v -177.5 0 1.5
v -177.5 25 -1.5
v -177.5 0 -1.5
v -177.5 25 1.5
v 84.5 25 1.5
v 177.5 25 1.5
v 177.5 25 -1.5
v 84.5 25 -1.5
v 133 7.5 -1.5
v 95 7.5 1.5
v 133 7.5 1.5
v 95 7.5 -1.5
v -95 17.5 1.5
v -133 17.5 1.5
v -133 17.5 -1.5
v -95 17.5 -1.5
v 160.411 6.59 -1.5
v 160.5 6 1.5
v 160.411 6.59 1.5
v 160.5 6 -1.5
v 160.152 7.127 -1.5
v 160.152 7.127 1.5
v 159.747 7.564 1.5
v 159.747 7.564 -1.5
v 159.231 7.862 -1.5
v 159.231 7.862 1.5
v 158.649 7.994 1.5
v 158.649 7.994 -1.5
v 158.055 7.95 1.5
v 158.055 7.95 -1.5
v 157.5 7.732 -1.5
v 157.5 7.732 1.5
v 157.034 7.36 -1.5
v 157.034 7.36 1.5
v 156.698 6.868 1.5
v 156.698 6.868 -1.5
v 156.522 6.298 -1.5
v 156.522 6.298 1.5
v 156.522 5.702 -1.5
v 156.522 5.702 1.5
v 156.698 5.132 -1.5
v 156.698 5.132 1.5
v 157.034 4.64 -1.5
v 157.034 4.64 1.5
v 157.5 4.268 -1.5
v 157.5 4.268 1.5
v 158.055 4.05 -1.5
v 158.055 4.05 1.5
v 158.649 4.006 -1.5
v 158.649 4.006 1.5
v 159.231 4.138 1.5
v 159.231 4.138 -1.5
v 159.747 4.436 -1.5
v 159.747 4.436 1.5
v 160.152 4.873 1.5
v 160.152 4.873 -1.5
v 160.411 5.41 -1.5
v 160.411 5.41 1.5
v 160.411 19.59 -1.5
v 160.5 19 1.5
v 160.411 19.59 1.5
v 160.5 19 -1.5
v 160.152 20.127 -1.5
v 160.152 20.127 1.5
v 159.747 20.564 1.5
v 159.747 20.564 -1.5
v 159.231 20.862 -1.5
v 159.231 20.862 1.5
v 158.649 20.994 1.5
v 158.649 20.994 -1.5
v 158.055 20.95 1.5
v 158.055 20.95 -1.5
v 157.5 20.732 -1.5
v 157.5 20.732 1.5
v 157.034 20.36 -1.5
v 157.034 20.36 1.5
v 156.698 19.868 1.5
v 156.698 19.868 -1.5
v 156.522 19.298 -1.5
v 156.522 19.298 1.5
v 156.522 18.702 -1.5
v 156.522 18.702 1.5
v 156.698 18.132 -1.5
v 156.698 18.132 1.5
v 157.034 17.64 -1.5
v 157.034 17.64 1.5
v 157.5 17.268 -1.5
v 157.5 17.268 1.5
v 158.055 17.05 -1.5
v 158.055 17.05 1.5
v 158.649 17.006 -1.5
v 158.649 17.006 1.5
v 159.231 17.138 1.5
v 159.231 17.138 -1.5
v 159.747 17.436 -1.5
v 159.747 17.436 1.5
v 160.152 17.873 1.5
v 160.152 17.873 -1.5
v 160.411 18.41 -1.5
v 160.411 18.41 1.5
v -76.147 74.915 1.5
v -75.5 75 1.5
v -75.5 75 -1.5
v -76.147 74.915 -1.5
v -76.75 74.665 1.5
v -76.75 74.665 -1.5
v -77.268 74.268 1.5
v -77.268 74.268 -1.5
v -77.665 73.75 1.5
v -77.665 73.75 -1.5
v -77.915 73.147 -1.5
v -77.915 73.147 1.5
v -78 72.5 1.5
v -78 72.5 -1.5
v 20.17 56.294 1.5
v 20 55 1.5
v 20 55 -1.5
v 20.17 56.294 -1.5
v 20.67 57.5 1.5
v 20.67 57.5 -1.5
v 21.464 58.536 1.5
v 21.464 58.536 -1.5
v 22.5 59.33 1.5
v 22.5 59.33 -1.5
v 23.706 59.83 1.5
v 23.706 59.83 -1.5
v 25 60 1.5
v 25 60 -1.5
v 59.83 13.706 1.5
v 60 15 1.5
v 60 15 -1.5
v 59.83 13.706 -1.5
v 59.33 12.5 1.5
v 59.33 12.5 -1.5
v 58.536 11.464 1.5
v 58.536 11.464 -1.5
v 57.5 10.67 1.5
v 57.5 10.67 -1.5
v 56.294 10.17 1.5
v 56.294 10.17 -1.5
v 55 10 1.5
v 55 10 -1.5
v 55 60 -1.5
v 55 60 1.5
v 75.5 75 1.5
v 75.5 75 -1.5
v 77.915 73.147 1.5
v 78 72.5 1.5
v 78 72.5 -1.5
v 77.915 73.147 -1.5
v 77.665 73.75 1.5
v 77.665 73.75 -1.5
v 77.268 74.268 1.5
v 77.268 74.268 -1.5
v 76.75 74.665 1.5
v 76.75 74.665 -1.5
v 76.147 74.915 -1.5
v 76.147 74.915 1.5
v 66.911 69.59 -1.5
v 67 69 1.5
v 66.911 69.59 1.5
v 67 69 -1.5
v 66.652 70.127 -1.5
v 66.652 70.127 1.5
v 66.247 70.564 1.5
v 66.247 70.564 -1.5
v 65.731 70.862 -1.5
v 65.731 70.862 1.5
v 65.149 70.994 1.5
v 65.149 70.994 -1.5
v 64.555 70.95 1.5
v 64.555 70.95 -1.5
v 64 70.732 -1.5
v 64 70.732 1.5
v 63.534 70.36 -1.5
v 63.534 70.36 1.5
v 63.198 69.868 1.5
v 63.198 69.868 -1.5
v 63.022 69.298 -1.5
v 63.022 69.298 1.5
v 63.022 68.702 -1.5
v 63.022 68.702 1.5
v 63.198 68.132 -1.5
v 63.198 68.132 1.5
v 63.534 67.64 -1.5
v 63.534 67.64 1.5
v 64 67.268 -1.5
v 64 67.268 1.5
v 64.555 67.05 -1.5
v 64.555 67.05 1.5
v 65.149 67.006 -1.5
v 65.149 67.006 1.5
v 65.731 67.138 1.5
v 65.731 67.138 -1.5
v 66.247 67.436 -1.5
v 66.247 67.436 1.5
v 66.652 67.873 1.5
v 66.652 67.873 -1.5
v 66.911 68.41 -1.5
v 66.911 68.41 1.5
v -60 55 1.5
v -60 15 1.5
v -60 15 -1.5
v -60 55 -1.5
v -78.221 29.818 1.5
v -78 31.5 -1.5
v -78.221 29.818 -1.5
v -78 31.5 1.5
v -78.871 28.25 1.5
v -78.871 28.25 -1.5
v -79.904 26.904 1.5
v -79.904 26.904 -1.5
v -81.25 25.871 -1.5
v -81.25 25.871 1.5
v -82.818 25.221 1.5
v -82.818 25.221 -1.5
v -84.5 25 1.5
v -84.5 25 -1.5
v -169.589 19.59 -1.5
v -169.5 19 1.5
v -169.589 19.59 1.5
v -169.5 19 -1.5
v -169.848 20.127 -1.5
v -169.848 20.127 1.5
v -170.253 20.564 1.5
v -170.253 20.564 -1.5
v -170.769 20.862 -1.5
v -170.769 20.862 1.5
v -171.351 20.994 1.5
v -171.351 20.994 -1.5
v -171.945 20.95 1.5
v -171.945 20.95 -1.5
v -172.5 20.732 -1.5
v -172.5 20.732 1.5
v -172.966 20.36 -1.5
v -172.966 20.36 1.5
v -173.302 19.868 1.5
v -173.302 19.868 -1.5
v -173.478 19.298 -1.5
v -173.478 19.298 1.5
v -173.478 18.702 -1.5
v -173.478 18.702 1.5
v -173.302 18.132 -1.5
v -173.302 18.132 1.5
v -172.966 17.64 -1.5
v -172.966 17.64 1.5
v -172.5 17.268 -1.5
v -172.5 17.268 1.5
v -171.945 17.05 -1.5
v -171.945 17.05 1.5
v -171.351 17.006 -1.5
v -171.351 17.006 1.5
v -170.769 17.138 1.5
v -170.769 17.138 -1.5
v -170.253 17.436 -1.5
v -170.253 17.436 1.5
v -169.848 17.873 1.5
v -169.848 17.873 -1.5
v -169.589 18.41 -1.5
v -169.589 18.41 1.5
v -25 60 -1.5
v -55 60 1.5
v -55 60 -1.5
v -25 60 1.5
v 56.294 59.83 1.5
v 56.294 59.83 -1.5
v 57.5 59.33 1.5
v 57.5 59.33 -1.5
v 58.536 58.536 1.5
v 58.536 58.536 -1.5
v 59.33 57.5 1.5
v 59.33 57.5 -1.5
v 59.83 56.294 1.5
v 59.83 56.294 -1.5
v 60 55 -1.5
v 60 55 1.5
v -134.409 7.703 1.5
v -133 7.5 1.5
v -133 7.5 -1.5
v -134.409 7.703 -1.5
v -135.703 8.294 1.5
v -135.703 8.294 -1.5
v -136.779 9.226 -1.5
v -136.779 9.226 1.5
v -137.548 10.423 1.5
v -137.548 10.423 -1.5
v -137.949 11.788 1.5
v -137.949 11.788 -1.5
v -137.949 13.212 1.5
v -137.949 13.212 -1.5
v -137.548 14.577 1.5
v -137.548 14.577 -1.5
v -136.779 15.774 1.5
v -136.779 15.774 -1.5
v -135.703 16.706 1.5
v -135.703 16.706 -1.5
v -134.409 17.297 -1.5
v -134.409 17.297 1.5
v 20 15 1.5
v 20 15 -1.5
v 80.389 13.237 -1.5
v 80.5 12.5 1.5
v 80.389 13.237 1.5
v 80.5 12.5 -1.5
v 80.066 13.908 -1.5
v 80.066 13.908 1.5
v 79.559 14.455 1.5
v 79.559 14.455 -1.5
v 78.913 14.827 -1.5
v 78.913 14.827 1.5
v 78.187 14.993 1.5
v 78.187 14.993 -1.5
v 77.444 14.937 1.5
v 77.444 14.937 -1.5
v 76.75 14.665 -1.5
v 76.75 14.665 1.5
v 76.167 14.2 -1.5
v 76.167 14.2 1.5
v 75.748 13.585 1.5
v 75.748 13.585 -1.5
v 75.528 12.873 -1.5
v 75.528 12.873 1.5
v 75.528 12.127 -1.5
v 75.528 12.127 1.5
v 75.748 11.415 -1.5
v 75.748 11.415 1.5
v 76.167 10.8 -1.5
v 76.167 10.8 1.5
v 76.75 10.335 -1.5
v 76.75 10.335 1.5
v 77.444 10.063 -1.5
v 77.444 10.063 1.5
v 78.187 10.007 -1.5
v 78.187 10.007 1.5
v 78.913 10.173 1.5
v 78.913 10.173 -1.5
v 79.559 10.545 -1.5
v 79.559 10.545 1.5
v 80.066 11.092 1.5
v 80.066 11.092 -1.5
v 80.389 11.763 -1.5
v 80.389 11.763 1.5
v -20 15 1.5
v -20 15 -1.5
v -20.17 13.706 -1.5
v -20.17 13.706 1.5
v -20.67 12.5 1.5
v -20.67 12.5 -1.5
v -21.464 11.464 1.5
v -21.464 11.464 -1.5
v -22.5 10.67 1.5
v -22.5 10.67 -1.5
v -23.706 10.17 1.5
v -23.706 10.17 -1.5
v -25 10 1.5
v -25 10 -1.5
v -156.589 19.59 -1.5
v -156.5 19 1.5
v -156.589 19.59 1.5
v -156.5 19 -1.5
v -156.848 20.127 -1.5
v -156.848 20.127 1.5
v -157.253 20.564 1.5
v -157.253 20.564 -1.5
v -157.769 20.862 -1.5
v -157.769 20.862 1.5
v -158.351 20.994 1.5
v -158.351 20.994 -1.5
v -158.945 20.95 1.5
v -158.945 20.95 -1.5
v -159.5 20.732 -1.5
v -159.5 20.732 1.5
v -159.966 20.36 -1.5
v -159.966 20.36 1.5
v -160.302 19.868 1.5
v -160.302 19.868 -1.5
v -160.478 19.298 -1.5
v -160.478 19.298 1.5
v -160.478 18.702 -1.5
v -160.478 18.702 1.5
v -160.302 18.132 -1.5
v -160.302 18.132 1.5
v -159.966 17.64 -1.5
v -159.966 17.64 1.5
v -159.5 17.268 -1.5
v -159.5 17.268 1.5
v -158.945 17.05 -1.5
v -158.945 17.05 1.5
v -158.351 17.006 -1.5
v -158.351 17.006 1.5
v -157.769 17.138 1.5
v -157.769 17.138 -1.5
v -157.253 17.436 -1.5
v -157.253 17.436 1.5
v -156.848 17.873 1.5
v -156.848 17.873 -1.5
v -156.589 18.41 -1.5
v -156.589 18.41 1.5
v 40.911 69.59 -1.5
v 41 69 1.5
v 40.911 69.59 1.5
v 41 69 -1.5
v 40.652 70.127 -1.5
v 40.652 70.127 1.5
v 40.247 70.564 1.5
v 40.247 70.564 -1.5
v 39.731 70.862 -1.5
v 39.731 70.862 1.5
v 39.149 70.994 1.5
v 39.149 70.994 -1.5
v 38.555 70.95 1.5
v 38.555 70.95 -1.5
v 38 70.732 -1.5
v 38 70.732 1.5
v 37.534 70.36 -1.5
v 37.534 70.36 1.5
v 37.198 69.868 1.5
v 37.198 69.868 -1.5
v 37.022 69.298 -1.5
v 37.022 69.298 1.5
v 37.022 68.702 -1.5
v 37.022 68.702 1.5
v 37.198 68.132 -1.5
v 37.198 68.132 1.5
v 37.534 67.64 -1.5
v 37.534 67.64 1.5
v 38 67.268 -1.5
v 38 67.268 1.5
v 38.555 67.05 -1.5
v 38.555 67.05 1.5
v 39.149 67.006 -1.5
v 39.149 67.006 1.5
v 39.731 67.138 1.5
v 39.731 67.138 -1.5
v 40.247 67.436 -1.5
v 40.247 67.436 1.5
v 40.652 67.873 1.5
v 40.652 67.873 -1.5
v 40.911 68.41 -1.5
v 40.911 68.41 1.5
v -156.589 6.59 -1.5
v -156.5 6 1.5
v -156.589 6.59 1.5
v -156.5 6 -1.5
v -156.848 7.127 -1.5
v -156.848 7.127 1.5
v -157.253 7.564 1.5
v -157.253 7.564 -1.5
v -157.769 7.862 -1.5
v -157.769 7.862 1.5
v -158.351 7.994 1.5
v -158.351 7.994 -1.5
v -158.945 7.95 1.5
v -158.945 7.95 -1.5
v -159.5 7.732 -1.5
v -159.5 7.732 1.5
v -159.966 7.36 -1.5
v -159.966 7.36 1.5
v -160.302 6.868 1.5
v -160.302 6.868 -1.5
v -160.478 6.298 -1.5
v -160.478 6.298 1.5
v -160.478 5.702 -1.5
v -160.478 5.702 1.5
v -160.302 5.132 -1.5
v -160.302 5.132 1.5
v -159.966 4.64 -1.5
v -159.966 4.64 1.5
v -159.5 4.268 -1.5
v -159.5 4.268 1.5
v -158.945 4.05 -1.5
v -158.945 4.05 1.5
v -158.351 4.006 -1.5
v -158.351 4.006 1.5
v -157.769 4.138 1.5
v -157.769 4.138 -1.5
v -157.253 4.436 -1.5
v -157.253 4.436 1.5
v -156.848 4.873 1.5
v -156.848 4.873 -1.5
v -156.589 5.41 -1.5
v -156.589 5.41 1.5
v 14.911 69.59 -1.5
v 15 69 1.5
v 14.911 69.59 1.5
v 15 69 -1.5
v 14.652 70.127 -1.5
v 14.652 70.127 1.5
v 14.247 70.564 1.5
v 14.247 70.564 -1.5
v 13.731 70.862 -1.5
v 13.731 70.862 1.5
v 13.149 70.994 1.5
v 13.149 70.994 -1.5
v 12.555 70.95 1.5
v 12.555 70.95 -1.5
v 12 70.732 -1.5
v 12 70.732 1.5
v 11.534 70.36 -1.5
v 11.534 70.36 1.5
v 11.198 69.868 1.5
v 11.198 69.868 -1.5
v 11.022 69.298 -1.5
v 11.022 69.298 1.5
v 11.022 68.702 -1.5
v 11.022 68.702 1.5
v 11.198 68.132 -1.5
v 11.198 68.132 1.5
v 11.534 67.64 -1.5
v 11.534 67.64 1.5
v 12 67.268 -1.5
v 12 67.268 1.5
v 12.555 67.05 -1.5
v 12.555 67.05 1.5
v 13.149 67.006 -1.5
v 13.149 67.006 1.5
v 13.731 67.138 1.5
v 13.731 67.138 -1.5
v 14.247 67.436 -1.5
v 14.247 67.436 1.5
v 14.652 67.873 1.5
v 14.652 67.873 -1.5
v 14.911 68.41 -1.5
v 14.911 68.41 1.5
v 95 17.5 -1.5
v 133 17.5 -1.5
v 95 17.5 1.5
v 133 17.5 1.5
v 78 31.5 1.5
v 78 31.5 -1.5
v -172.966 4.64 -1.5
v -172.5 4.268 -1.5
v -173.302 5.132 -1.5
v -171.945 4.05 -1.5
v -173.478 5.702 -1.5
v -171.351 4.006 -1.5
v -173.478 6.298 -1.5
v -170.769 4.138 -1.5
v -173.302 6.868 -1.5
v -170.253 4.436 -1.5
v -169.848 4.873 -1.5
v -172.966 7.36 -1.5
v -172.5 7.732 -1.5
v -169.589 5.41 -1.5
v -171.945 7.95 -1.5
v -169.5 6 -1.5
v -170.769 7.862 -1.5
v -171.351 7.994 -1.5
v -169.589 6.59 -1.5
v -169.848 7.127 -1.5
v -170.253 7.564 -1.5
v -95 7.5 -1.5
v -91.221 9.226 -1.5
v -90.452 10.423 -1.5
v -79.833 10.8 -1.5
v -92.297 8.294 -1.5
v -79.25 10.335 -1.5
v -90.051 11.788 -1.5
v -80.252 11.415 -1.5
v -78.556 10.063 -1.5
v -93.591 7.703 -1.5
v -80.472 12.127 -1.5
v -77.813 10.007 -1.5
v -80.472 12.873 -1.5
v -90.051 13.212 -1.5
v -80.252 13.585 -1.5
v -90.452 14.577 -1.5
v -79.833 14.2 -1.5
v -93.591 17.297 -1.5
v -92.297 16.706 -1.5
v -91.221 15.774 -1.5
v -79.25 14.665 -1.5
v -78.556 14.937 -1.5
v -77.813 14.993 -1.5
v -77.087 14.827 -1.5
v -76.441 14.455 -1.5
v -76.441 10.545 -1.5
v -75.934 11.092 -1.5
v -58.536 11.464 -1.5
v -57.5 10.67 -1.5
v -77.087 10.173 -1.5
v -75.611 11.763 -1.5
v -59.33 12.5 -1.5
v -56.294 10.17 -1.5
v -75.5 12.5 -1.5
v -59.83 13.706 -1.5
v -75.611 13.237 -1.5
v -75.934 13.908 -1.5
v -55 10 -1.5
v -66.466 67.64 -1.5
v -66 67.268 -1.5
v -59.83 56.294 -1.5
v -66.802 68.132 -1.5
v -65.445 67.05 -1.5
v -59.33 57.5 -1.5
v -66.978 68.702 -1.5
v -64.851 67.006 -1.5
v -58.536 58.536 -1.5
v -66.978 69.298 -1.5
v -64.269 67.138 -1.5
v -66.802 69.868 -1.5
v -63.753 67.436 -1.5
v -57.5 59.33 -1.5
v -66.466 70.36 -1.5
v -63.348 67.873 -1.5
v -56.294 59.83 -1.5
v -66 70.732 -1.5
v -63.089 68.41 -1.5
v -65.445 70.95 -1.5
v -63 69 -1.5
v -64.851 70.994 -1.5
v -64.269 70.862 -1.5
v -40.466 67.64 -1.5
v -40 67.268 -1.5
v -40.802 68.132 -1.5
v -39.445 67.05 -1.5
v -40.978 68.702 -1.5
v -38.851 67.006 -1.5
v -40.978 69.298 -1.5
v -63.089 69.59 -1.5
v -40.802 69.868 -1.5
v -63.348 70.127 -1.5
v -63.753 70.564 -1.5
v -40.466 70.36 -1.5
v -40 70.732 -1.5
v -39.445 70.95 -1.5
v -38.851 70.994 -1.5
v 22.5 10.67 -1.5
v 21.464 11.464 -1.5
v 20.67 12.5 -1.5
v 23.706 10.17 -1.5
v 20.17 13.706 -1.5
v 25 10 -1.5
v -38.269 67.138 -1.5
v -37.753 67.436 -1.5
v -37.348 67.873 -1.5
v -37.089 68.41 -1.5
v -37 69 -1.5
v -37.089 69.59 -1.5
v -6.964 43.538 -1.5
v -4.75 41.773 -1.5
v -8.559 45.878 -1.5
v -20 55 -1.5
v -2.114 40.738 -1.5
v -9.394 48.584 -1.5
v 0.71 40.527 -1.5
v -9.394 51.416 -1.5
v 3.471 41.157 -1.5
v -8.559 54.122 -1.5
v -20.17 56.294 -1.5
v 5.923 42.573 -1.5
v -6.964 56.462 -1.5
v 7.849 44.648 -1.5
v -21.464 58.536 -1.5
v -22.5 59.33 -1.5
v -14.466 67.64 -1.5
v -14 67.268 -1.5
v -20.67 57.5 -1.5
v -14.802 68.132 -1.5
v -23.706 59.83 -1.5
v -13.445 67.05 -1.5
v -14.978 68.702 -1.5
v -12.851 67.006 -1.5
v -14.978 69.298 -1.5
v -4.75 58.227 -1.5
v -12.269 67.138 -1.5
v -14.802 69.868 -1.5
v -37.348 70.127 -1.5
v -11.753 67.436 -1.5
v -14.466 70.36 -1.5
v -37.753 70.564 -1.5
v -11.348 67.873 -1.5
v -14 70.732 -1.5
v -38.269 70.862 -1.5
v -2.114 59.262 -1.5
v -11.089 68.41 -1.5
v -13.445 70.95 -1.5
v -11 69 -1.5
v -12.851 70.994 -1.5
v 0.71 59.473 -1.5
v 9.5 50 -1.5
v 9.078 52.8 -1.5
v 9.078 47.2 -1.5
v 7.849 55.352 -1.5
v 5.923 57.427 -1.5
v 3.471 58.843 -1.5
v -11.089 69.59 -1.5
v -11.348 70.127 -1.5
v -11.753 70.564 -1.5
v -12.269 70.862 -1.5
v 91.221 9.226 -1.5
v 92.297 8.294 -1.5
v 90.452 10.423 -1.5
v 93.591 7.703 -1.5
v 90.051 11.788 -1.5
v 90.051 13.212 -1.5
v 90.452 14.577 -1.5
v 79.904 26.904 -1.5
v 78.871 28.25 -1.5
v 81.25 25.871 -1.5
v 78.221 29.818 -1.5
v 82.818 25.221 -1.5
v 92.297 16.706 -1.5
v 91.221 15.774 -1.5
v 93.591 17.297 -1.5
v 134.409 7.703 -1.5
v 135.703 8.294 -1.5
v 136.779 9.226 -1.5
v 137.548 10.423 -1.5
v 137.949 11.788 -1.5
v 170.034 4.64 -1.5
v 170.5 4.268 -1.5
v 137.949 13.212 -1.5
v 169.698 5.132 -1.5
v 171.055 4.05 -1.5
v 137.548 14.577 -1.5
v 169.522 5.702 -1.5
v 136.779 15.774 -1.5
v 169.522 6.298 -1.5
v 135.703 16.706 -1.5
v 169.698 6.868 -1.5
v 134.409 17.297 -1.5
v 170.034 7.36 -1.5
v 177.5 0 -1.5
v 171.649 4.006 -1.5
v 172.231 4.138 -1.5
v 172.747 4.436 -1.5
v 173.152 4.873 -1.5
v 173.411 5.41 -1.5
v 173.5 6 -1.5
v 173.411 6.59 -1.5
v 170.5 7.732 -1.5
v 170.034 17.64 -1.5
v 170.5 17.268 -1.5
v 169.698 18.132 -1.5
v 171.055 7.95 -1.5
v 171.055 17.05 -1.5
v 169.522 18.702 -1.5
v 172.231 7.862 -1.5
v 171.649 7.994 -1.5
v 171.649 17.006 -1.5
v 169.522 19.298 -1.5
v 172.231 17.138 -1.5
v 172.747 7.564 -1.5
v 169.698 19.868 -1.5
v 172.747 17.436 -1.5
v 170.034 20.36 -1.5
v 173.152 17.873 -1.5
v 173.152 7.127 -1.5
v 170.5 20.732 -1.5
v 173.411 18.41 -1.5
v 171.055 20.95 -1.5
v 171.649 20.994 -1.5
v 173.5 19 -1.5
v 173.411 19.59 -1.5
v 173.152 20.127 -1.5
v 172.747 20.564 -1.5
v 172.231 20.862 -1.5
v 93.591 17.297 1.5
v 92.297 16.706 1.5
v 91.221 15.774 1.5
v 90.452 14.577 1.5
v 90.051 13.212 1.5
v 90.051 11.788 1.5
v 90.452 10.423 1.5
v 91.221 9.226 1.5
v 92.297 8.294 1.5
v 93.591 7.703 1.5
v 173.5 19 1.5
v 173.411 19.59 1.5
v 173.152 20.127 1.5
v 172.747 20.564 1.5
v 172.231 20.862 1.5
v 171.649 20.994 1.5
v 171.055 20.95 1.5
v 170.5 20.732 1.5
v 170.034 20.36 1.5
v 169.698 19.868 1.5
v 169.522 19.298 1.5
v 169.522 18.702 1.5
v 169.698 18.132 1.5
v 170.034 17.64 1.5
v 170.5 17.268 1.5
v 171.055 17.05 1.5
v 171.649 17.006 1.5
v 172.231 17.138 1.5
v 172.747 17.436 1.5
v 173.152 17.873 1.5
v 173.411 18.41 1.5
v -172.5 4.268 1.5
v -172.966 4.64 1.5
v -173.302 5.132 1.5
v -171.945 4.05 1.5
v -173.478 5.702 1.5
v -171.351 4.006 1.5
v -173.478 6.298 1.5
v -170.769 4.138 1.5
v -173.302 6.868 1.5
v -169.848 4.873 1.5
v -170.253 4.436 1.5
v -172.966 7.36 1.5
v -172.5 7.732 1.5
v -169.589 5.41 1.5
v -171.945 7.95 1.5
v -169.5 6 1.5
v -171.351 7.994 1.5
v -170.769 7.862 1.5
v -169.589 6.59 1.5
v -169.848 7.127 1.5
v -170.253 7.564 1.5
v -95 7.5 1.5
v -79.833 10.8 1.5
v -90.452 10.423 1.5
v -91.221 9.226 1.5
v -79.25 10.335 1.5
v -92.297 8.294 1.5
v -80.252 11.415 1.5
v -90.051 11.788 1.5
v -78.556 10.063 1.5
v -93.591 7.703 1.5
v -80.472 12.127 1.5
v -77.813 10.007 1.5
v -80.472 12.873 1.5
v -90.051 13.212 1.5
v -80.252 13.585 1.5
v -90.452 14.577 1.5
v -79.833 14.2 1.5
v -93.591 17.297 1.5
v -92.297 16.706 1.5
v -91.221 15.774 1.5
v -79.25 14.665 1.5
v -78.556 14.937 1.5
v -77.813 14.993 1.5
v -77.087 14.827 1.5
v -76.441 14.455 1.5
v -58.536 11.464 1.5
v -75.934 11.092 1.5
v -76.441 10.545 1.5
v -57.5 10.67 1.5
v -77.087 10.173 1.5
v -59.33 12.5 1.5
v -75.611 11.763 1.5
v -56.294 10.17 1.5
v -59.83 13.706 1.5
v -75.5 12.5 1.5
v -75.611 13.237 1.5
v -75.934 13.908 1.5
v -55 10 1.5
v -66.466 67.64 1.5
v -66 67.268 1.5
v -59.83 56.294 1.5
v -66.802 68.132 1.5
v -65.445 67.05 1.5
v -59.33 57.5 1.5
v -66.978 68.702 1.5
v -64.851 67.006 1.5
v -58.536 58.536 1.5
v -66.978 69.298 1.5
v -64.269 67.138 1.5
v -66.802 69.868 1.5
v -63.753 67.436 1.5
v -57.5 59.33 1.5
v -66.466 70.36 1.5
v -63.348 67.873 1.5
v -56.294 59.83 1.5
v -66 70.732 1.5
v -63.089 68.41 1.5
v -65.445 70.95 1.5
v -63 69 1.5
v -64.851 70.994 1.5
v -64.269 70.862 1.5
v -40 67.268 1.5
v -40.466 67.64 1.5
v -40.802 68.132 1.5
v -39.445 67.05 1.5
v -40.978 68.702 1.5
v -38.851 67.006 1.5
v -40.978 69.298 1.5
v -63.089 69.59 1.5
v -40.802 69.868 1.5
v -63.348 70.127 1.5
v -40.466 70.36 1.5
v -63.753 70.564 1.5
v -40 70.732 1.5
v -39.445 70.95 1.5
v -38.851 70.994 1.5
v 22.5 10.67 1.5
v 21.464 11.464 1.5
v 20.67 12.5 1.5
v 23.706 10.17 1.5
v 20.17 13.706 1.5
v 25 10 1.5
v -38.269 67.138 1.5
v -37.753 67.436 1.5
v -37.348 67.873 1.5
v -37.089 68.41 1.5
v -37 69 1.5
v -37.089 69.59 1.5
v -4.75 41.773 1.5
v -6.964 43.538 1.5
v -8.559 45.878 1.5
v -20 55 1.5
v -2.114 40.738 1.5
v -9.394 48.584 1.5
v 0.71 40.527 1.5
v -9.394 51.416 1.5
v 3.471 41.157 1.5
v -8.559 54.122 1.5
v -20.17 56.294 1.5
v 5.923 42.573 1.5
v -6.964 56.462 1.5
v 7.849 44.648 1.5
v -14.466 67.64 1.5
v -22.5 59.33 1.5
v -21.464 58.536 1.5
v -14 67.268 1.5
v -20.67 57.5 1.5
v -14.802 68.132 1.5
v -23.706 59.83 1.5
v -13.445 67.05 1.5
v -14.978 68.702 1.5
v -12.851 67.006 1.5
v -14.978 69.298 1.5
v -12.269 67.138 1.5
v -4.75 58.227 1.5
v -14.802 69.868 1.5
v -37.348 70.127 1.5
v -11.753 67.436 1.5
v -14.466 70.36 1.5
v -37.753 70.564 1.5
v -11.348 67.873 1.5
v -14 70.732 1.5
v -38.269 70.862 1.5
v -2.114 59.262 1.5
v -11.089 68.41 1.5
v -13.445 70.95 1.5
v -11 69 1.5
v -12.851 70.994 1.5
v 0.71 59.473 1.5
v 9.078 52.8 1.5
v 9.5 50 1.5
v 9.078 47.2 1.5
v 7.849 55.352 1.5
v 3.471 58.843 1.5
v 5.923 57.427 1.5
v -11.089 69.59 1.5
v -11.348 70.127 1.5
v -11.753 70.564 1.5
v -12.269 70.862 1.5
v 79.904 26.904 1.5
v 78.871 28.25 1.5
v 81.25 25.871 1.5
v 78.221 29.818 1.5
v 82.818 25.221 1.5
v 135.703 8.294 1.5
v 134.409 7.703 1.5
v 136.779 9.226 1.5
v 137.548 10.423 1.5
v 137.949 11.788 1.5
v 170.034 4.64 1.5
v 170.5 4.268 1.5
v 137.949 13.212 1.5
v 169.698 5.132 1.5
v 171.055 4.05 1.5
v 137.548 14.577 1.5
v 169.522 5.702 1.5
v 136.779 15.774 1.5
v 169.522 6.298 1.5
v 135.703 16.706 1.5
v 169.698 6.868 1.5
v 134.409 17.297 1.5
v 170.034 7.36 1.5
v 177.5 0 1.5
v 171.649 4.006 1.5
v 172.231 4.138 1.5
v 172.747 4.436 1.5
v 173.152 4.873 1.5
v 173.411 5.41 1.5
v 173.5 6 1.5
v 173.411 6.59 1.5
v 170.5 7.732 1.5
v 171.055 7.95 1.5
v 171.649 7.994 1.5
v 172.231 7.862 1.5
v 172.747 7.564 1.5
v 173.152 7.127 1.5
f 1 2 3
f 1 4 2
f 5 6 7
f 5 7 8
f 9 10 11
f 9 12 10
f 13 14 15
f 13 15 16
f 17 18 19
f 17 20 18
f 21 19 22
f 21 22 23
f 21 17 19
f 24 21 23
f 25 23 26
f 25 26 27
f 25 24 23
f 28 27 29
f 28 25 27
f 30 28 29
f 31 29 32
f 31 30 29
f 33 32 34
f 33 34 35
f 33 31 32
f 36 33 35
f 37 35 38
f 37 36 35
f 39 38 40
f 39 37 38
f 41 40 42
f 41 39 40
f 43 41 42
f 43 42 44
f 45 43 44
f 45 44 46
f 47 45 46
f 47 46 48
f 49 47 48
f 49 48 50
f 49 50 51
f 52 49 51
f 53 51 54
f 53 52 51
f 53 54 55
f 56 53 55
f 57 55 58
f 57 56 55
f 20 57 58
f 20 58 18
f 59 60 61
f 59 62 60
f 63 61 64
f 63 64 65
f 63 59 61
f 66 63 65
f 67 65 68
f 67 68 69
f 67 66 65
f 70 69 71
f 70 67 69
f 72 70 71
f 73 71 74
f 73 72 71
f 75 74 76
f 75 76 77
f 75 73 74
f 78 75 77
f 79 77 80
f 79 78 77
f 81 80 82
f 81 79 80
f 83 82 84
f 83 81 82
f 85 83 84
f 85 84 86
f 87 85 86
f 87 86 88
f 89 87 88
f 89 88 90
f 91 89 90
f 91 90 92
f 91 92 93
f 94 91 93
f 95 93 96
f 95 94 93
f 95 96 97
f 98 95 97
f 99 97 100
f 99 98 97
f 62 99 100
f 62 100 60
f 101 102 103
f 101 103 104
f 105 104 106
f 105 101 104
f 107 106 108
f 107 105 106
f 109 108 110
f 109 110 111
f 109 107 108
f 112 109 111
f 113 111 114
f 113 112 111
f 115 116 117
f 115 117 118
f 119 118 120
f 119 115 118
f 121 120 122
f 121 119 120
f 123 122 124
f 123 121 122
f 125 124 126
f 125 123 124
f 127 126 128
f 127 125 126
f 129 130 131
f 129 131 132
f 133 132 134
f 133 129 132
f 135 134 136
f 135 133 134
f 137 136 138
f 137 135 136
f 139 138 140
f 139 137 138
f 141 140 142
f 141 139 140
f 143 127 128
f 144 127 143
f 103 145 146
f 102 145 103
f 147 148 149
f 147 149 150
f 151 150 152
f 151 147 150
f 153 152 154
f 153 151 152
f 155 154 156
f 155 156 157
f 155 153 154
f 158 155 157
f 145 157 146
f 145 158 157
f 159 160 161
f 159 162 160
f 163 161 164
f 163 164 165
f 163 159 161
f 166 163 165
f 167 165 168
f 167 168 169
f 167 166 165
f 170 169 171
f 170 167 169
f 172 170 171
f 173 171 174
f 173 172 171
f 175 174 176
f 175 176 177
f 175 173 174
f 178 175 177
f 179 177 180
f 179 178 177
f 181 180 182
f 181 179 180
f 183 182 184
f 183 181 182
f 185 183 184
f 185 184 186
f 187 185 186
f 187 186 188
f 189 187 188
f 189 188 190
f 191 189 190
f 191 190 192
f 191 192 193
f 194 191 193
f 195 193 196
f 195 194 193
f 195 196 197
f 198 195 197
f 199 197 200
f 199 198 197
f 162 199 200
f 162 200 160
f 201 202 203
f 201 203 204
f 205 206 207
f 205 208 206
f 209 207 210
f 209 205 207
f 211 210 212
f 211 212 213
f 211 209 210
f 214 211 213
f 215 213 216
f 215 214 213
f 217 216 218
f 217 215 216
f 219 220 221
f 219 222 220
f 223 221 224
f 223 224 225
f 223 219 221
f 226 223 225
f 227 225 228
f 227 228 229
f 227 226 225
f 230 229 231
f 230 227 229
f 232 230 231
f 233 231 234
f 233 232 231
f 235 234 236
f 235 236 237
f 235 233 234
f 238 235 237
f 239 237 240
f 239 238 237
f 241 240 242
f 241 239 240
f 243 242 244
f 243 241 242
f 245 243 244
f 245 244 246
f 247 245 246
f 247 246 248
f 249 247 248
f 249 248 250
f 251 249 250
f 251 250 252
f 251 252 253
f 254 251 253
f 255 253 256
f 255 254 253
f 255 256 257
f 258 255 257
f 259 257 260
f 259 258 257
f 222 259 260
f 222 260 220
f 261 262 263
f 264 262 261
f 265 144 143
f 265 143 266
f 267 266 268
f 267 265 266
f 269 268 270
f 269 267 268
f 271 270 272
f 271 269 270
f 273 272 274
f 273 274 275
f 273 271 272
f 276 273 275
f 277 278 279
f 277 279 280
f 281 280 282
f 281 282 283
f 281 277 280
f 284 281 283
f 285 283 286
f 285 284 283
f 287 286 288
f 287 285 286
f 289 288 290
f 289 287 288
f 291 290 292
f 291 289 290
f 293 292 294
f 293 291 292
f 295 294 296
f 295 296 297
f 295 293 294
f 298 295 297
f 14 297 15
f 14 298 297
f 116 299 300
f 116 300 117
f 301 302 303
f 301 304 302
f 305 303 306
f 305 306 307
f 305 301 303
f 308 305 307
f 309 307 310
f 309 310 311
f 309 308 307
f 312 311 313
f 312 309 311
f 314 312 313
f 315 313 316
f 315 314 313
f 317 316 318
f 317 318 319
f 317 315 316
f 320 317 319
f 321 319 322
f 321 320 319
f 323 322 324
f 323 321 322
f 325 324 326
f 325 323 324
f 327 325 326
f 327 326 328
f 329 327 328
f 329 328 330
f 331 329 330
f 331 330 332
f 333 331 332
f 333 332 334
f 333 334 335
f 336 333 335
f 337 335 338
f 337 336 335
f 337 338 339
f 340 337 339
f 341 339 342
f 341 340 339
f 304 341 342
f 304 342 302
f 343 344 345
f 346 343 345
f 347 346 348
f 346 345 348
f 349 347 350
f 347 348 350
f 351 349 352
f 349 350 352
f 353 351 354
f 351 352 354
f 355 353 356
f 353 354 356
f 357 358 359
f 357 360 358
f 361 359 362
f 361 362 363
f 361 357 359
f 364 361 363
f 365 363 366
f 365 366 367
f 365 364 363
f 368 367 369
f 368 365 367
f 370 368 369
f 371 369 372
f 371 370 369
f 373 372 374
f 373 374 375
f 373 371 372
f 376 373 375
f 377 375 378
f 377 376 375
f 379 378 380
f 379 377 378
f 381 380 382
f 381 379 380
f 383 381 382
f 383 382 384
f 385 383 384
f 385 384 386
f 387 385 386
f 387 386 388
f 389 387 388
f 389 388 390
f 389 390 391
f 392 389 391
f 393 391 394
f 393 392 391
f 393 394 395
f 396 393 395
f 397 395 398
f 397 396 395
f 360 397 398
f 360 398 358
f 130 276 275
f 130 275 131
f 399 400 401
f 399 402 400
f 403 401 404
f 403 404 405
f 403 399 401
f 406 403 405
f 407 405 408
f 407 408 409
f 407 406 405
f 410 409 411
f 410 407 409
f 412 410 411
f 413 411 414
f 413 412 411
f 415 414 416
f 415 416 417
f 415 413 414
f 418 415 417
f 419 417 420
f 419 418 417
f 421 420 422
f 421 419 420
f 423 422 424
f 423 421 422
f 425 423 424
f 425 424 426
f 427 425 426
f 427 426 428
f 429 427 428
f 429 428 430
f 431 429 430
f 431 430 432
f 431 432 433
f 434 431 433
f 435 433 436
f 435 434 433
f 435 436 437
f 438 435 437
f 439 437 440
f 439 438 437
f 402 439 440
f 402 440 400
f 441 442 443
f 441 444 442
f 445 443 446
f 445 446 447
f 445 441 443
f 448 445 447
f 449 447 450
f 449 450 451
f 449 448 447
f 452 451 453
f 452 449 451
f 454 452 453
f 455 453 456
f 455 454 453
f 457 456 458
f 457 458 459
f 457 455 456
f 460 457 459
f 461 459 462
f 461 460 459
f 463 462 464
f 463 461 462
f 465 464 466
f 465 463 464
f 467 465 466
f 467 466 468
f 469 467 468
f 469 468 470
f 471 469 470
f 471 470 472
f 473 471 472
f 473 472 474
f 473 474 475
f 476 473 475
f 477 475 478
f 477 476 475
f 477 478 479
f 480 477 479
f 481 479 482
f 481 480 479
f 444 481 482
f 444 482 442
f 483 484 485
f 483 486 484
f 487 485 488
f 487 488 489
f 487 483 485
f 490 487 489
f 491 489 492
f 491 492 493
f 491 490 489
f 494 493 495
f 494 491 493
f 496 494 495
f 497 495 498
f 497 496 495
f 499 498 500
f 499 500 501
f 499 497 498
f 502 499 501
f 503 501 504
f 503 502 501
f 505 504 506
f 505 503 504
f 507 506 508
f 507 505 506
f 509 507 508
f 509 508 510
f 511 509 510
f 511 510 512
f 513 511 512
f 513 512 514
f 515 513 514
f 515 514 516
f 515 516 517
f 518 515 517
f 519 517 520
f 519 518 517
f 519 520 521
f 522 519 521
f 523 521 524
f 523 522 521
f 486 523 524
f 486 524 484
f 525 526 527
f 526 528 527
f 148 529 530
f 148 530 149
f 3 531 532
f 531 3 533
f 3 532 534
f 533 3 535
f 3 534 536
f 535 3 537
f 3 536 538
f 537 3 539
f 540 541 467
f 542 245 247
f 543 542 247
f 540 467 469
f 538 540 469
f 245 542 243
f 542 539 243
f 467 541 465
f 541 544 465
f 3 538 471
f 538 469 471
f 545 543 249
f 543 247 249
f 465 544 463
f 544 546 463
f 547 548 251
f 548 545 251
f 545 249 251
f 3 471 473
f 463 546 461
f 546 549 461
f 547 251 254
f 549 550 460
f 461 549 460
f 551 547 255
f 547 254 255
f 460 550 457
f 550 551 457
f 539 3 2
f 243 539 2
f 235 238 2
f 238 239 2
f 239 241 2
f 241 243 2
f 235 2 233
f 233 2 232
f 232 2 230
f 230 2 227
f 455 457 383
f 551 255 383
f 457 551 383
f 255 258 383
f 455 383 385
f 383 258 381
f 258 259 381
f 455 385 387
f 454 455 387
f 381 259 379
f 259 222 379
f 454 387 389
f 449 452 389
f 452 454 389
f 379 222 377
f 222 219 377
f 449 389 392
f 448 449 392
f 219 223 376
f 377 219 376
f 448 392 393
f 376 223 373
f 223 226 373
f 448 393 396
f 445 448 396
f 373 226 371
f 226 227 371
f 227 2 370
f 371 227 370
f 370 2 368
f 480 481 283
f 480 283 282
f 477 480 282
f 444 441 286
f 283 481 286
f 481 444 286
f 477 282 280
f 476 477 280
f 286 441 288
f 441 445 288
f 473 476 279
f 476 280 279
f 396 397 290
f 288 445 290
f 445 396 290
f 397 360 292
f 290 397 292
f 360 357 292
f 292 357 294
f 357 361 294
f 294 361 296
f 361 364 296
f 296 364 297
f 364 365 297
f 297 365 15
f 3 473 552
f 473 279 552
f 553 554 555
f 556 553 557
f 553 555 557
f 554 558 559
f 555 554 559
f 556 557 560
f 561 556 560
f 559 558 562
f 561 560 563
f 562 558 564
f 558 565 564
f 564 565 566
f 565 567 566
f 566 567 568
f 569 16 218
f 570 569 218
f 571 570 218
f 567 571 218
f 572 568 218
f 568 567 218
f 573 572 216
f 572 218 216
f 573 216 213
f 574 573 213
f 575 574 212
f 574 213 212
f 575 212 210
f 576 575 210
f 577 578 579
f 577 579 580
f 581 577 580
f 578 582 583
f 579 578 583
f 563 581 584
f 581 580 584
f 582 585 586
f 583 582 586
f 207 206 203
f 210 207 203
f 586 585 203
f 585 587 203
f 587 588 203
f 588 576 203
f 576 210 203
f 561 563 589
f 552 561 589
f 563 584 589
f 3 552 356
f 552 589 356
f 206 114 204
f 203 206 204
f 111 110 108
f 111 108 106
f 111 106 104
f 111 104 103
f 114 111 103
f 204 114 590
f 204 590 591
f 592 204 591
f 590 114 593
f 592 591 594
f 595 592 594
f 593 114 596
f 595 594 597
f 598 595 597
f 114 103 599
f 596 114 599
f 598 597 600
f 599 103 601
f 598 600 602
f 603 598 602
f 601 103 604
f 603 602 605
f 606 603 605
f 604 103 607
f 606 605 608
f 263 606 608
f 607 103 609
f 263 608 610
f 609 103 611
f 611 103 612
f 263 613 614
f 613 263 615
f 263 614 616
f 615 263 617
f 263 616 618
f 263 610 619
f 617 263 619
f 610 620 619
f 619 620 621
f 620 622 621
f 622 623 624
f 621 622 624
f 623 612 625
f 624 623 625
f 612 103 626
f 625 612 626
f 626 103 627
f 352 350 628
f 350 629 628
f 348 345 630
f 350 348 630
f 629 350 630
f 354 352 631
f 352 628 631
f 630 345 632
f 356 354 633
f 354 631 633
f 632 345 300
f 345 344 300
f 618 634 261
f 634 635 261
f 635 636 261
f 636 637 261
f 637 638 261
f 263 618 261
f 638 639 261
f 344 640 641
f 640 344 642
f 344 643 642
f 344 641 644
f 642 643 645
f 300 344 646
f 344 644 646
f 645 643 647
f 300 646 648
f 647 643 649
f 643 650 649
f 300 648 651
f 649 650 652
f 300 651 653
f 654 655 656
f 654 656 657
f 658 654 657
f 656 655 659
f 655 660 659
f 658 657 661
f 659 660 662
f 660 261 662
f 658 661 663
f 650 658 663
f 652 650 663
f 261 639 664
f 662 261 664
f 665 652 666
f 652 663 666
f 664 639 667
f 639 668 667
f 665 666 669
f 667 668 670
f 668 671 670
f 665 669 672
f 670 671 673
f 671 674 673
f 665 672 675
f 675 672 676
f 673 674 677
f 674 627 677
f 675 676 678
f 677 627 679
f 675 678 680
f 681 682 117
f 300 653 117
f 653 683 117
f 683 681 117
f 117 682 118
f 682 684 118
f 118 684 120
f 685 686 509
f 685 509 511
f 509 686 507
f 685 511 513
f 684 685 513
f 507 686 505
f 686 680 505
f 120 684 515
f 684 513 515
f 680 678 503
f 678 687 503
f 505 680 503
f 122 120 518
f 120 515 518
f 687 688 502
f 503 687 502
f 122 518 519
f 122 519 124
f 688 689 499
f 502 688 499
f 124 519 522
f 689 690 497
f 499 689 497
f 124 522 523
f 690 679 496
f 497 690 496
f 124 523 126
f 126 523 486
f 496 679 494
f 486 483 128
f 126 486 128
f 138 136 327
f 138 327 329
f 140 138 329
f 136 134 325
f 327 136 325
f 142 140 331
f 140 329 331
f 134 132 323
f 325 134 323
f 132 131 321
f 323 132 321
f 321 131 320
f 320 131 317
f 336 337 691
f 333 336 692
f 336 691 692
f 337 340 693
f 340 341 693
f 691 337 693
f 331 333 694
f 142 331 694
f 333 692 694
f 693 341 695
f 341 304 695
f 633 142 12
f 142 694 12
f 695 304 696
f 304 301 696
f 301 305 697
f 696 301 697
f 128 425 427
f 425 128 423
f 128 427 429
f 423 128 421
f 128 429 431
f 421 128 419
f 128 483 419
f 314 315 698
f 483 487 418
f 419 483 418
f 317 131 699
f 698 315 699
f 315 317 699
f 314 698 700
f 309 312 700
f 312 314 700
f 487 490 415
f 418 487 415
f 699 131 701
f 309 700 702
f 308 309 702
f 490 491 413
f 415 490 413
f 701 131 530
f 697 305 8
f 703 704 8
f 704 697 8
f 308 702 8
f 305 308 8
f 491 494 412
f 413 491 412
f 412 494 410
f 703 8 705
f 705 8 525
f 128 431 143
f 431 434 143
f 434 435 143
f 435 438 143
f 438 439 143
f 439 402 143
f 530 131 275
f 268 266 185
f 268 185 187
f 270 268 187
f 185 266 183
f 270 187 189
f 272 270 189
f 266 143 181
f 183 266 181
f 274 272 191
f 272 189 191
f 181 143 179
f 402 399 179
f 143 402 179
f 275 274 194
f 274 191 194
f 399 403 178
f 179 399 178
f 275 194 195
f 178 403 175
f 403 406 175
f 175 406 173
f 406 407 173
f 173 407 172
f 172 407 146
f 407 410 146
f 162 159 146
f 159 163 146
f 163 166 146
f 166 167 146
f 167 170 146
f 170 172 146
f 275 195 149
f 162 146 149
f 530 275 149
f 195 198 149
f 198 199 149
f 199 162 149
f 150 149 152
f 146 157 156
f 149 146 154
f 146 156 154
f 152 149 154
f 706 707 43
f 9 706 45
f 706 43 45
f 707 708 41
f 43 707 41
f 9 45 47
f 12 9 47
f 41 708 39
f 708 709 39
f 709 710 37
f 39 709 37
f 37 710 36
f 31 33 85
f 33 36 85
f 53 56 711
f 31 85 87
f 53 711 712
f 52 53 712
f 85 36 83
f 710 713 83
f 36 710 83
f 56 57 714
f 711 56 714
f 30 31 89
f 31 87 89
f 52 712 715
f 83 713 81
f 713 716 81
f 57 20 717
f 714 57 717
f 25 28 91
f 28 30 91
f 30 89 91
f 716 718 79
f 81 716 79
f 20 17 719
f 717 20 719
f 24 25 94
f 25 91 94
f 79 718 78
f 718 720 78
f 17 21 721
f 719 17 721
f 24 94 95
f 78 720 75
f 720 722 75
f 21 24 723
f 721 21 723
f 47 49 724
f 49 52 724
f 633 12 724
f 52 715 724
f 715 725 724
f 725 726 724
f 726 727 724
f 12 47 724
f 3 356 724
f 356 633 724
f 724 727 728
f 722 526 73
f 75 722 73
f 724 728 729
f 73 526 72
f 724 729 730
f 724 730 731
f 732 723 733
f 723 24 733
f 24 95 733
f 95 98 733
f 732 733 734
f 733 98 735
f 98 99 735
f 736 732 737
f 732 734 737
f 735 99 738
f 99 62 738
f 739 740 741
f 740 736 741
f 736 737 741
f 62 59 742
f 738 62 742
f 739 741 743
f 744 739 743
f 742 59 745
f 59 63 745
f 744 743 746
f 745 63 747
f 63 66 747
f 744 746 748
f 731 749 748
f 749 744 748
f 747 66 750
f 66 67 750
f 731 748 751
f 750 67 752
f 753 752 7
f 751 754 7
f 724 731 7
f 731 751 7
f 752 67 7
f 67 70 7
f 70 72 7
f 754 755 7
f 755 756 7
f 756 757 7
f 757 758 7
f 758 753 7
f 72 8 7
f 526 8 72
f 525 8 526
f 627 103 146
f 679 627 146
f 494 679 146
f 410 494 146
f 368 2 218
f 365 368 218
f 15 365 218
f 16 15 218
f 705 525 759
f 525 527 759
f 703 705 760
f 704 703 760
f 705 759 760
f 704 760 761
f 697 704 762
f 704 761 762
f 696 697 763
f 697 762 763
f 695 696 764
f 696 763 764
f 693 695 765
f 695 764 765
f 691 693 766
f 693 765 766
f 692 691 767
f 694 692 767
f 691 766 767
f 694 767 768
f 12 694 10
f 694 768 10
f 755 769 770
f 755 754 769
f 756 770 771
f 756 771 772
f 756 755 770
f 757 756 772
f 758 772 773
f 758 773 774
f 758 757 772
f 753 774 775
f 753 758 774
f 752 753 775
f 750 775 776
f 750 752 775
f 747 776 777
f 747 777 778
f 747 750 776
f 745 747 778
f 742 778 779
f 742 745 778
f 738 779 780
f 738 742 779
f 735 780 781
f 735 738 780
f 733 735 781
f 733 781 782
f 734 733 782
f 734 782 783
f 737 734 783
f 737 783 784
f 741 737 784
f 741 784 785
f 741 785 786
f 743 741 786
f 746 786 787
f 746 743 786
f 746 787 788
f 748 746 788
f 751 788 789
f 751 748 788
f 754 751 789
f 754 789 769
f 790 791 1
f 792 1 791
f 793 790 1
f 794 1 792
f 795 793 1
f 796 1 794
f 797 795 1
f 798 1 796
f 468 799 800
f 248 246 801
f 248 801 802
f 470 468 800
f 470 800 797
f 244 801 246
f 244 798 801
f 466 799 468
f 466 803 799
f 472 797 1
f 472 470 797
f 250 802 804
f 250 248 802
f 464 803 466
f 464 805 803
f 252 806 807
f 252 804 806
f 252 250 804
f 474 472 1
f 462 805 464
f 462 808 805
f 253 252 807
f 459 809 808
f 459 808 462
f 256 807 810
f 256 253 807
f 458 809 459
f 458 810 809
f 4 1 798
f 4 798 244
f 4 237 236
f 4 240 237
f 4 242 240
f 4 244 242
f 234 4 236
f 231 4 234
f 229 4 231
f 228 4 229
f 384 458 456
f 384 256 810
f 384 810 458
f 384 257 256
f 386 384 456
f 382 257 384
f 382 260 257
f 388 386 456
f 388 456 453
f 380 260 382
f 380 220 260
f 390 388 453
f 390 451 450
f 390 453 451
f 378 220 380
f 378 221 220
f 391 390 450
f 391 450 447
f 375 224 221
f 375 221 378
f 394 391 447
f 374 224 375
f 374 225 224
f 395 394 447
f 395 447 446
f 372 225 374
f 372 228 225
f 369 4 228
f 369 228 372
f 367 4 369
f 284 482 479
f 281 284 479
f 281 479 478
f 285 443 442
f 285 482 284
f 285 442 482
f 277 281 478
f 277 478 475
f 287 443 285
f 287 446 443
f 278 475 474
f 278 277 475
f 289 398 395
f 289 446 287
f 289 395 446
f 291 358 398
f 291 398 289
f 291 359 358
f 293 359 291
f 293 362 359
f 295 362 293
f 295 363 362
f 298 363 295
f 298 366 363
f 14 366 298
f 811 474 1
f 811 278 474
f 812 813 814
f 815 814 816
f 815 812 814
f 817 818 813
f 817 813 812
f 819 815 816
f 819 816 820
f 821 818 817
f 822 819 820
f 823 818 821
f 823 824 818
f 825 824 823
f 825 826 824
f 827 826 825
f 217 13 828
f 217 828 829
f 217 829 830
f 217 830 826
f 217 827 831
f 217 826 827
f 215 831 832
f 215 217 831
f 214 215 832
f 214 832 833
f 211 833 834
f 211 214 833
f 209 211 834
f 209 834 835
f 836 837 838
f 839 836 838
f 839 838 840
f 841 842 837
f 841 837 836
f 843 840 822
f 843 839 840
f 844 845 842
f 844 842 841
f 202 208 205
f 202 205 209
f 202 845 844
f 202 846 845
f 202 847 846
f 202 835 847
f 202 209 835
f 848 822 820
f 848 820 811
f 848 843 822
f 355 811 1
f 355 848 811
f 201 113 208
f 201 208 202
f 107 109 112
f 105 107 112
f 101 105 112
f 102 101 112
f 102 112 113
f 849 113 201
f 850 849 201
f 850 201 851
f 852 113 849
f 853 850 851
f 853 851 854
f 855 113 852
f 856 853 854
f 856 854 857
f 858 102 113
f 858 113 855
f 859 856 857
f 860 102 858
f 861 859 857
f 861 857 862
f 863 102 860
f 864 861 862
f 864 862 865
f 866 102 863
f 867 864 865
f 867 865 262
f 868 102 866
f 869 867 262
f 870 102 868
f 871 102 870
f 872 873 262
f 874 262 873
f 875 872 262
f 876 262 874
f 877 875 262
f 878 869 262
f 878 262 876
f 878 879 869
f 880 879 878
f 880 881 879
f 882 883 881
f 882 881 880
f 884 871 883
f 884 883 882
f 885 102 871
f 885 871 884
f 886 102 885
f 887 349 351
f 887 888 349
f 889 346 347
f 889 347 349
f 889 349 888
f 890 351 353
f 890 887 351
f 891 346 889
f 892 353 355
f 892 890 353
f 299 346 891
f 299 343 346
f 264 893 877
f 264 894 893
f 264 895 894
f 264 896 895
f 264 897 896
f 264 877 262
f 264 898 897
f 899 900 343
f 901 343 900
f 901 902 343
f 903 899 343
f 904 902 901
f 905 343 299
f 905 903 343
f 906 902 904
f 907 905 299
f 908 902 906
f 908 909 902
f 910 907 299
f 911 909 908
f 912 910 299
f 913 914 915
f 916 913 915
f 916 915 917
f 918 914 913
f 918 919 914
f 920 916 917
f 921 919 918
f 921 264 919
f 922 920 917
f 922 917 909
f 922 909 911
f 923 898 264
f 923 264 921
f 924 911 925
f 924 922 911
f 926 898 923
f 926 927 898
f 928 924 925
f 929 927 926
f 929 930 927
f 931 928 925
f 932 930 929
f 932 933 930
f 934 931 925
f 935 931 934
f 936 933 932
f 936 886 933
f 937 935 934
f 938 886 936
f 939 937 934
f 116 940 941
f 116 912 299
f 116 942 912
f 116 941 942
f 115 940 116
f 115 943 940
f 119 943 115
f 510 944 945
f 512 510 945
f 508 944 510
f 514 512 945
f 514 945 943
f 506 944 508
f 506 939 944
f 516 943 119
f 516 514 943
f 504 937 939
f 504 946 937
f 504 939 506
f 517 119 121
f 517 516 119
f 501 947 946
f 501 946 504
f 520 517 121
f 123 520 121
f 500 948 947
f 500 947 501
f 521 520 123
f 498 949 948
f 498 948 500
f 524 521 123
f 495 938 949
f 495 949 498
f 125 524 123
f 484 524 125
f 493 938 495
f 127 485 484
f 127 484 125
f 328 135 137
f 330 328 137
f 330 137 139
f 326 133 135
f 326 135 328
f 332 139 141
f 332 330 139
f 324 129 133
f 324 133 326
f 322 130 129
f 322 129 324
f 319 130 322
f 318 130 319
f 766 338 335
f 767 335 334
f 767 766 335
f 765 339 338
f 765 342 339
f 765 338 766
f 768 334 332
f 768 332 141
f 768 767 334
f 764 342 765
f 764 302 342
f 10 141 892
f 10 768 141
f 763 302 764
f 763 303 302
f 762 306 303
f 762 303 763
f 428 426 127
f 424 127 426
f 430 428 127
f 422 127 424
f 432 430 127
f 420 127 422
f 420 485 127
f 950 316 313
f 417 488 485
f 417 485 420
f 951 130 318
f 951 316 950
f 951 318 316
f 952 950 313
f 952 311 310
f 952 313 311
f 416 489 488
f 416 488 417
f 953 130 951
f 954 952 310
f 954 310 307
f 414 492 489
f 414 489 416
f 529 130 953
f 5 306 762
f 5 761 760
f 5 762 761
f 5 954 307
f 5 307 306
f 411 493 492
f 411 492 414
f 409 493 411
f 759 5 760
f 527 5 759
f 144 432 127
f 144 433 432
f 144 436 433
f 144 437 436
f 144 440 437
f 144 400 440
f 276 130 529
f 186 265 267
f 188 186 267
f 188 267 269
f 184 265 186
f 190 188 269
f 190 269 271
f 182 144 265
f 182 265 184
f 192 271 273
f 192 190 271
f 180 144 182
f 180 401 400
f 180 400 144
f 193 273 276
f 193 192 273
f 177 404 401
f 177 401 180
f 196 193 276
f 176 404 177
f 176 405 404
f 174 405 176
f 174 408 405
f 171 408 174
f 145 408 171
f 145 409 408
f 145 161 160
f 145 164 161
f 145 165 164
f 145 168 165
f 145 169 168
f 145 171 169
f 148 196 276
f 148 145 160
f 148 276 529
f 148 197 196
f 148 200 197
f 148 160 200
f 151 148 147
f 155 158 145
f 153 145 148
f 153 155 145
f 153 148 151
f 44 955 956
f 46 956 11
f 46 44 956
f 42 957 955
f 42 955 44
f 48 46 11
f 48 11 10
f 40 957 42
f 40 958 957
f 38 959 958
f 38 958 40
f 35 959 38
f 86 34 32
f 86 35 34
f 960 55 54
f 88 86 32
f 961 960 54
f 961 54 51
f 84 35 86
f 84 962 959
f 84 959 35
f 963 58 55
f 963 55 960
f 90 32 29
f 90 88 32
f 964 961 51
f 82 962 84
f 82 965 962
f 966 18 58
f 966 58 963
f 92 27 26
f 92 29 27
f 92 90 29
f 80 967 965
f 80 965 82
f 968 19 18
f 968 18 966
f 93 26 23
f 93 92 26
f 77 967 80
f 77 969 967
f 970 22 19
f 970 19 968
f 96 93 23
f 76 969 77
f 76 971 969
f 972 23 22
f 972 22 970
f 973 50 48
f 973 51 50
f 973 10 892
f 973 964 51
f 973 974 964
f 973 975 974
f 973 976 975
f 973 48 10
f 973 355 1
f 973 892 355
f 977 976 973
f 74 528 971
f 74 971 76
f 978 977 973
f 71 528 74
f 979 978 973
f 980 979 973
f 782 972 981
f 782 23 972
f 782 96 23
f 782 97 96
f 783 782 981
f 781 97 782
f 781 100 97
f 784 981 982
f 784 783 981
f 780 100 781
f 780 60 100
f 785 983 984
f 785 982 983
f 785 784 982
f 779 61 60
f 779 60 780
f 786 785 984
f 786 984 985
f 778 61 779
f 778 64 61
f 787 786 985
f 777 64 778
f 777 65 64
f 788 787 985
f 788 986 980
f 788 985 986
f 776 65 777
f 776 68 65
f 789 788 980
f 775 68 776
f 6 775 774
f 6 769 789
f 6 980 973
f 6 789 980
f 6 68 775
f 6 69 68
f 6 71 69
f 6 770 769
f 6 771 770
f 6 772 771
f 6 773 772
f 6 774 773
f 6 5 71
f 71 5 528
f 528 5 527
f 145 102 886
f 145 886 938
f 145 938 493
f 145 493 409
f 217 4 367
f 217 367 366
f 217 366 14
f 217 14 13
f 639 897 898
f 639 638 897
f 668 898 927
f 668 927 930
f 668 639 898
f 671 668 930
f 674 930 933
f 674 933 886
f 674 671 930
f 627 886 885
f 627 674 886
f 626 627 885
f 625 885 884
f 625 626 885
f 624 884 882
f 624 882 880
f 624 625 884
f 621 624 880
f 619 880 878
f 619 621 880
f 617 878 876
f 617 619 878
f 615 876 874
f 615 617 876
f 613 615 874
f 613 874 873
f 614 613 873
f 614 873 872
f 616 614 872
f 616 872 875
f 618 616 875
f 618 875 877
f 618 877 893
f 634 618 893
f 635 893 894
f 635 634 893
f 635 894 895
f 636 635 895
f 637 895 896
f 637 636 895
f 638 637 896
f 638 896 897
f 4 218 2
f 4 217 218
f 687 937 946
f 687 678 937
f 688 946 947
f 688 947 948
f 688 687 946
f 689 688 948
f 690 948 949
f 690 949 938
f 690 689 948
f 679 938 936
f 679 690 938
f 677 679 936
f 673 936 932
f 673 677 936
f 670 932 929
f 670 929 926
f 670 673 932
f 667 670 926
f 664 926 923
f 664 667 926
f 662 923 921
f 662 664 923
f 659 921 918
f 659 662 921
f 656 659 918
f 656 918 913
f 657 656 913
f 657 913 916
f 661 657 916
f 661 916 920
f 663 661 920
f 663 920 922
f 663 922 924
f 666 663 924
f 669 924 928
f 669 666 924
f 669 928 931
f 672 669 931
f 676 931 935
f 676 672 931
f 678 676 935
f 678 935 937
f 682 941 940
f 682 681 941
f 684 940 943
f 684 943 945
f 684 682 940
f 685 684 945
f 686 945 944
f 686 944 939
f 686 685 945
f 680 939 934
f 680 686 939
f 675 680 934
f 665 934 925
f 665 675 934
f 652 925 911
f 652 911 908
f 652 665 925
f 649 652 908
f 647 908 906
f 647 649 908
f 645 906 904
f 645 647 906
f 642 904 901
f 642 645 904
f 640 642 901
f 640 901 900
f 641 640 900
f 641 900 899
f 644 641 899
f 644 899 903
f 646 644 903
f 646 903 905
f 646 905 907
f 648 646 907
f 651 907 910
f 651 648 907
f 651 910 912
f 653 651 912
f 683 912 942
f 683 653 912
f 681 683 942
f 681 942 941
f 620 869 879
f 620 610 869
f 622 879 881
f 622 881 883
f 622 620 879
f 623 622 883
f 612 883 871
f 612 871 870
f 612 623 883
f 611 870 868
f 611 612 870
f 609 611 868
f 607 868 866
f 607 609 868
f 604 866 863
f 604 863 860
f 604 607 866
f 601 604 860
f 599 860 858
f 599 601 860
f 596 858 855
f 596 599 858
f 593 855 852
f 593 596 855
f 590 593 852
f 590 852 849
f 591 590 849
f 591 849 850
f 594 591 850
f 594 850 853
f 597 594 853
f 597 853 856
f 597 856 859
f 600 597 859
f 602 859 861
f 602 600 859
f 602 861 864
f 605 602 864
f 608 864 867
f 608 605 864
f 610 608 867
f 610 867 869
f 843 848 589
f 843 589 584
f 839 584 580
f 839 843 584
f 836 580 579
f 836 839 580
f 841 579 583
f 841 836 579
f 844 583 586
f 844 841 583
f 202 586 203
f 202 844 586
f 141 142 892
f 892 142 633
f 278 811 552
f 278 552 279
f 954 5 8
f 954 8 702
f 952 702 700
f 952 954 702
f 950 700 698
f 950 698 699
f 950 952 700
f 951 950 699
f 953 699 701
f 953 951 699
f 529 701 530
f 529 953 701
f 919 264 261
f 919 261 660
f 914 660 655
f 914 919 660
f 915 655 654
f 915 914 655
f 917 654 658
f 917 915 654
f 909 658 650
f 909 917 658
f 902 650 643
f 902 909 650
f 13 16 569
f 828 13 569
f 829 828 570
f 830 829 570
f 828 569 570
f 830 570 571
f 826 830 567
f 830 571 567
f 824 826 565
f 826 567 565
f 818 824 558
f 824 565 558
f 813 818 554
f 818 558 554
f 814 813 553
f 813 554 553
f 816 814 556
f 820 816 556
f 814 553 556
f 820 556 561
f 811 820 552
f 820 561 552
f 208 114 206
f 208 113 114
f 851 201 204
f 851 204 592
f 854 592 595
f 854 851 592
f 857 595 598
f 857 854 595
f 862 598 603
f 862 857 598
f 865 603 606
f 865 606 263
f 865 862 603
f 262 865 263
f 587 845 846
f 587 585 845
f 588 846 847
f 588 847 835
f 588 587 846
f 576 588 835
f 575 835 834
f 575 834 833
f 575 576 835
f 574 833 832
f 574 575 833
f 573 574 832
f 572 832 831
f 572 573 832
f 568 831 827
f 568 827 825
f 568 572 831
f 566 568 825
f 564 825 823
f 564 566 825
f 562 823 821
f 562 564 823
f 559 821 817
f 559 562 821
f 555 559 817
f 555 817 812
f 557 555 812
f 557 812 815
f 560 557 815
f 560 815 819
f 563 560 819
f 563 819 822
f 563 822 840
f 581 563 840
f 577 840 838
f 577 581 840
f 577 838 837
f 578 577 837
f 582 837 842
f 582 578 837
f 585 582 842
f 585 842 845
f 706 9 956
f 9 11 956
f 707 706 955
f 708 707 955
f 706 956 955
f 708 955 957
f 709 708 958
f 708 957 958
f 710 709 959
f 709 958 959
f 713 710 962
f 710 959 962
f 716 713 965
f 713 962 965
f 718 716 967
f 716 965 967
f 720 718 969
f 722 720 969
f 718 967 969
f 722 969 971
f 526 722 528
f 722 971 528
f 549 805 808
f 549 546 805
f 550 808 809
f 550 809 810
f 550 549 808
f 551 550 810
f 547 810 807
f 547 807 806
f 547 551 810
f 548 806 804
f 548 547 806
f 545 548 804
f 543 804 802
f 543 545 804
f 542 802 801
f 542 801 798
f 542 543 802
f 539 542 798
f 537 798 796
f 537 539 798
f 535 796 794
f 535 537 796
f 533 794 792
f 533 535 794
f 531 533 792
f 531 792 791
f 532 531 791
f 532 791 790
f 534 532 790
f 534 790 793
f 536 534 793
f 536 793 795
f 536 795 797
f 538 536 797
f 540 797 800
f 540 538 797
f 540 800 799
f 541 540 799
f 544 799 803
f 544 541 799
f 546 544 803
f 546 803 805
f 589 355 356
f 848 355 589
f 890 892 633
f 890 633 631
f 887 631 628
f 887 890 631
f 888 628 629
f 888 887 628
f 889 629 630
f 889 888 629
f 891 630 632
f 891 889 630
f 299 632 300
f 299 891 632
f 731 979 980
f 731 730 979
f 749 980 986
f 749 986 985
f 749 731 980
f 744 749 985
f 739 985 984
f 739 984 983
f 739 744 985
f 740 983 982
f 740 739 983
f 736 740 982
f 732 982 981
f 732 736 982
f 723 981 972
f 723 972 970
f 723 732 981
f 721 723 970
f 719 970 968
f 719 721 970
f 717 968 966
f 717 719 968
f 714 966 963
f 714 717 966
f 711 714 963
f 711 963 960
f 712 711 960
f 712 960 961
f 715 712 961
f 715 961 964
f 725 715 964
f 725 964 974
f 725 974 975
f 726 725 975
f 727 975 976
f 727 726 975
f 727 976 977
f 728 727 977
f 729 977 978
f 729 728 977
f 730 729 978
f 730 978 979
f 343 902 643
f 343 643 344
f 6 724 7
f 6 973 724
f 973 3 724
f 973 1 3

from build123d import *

# Parameters (mm, degrees)
SKETCH1_R           = 9.5
SKETCH1_R_2         = 2
SKETCH1_R_3         = 2.5
BOSS_EXTRUDE1_DEPTH = 1.5


with BuildPart() as part:
    # Sketch1 → Boss-Extrude1 (new, symmetric)
    with BuildSketch(Plane.XY):
        with BuildLine():
            Line((177.5, 0), (177.5, 25))
            Line((177.5, 25), (84.5, 25))
            ThreePointArc((84.5, 25), (79.903805922, 26.903805922), (78, 31.5))
            Line((78, 31.5), (78, 72.5))
            ThreePointArc((78, 72.5), (77.267766953, 74.267766953), (75.5, 75))
            Line((75.5, 75), (-75.5, 75))
            ThreePointArc((-75.5, 75), (-77.267766953, 74.267766953), (-78, 72.5))
            Line((-78, 72.5), (-78, 31.5))
            ThreePointArc((-78, 31.5), (-79.903805922, 26.903805922), (-84.5, 25))
            Line((-84.5, 25), (-177.5, 25))
            Line((-177.5, 25), (-177.5, 0))
            Line((-177.5, 0), (177.5, 0))
        make_face()
        with Locations((0, 50)):
            Circle(SKETCH1_R, mode=Mode.SUBTRACT)
        with Locations((-65, 69)):
            Circle(SKETCH1_R_2, mode=Mode.SUBTRACT)
        with Locations((-39, 69)):
            Circle(SKETCH1_R_2, mode=Mode.SUBTRACT)
        with Locations((-13, 69)):
            Circle(SKETCH1_R_2, mode=Mode.SUBTRACT)
        with Locations((13, 69)):
            Circle(SKETCH1_R_2, mode=Mode.SUBTRACT)
        with Locations((39, 69)):
            Circle(SKETCH1_R_2, mode=Mode.SUBTRACT)
        with Locations((65, 69)):
            Circle(SKETCH1_R_2, mode=Mode.SUBTRACT)
        with Locations((-78, 12.5)):
            Circle(SKETCH1_R_3, mode=Mode.SUBTRACT)
        with Locations((-171.5, 19)):
            Circle(SKETCH1_R_2, mode=Mode.SUBTRACT)
        with Locations((-158.5, 19)):
            Circle(SKETCH1_R_2, mode=Mode.SUBTRACT)
        with Locations((-171.5, 6)):
            Circle(SKETCH1_R_2, mode=Mode.SUBTRACT)
        with Locations((-158.5, 6)):
            Circle(SKETCH1_R_2, mode=Mode.SUBTRACT)
        with Locations((171.5, 6)):
            Circle(SKETCH1_R_2, mode=Mode.SUBTRACT)
        with Locations((171.5, 19)):
            Circle(SKETCH1_R_2, mode=Mode.SUBTRACT)
        with Locations((158.5, 19)):
            Circle(SKETCH1_R_2, mode=Mode.SUBTRACT)
        with Locations((158.5, 6)):
            Circle(SKETCH1_R_2, mode=Mode.SUBTRACT)
        with Locations((78, 12.5)):
            Circle(SKETCH1_R_3, mode=Mode.SUBTRACT)
        with BuildLine():
            Line((-55, 60), (-25, 60))
            ThreePointArc((-25, 60), (-21.464466094, 58.535533906), (-20, 55))
            Line((-20, 55), (-20, 15))
            ThreePointArc((-20, 15), (-21.464466094, 11.464466094), (-25, 10))
            Line((-25, 10), (-55, 10))
            ThreePointArc((-55, 10), (-58.535533906, 11.464466094), (-60, 15))
            Line((-60, 15), (-60, 55))
            ThreePointArc((-60, 55), (-58.535533906, 58.535533906), (-55, 60))
        make_face(mode=Mode.SUBTRACT)
        with BuildLine():
            Line((-133, 17.5), (-95, 17.5))
            ThreePointArc((-95, 17.5), (-90, 12.5), (-95, 7.5))
            Line((-95, 7.5), (-133, 7.5))
            ThreePointArc((-133, 7.5), (-138, 12.5), (-133, 17.5))
        make_face(mode=Mode.SUBTRACT)
        with BuildLine():
            Line((133, 17.5), (95, 17.5))
            ThreePointArc((95, 17.5), (90, 12.5), (95, 7.5))
            Line((95, 7.5), (133, 7.5))
            ThreePointArc((133, 7.5), (138, 12.5), (133, 17.5))
        make_face(mode=Mode.SUBTRACT)
        with BuildLine():
            Line((55, 10), (25, 10))
            ThreePointArc((25, 10), (21.464466094, 11.464466094), (20, 15))
            Line((20, 15), (20, 55))
            ThreePointArc((20, 55), (21.464466094, 58.535533906), (25, 60))
            Line((25, 60), (55, 60))
            ThreePointArc((55, 60), (58.535533906, 58.535533906), (60, 55))
            Line((60, 55), (60, 15))
            ThreePointArc((60, 15), (58.535533906, 11.464466094), (55, 10))
        make_face(mode=Mode.SUBTRACT)
    extrude(amount=BOSS_EXTRUDE1_DEPTH, both=True)


solid = part.part
